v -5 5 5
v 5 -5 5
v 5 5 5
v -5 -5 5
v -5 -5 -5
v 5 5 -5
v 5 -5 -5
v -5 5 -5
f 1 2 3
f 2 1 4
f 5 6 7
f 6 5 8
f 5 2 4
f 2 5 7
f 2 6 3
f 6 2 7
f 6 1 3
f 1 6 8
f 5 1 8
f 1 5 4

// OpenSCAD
// Generated by CadMonkey
// Prompt: hey cadmonkey, create me a cube
// Generated at: 2025-11-12 00:34:44

// Create a cube using cube() primitive
cube([10, 10, 10], center = true); // Centered cube with dimensions 10x10x10
